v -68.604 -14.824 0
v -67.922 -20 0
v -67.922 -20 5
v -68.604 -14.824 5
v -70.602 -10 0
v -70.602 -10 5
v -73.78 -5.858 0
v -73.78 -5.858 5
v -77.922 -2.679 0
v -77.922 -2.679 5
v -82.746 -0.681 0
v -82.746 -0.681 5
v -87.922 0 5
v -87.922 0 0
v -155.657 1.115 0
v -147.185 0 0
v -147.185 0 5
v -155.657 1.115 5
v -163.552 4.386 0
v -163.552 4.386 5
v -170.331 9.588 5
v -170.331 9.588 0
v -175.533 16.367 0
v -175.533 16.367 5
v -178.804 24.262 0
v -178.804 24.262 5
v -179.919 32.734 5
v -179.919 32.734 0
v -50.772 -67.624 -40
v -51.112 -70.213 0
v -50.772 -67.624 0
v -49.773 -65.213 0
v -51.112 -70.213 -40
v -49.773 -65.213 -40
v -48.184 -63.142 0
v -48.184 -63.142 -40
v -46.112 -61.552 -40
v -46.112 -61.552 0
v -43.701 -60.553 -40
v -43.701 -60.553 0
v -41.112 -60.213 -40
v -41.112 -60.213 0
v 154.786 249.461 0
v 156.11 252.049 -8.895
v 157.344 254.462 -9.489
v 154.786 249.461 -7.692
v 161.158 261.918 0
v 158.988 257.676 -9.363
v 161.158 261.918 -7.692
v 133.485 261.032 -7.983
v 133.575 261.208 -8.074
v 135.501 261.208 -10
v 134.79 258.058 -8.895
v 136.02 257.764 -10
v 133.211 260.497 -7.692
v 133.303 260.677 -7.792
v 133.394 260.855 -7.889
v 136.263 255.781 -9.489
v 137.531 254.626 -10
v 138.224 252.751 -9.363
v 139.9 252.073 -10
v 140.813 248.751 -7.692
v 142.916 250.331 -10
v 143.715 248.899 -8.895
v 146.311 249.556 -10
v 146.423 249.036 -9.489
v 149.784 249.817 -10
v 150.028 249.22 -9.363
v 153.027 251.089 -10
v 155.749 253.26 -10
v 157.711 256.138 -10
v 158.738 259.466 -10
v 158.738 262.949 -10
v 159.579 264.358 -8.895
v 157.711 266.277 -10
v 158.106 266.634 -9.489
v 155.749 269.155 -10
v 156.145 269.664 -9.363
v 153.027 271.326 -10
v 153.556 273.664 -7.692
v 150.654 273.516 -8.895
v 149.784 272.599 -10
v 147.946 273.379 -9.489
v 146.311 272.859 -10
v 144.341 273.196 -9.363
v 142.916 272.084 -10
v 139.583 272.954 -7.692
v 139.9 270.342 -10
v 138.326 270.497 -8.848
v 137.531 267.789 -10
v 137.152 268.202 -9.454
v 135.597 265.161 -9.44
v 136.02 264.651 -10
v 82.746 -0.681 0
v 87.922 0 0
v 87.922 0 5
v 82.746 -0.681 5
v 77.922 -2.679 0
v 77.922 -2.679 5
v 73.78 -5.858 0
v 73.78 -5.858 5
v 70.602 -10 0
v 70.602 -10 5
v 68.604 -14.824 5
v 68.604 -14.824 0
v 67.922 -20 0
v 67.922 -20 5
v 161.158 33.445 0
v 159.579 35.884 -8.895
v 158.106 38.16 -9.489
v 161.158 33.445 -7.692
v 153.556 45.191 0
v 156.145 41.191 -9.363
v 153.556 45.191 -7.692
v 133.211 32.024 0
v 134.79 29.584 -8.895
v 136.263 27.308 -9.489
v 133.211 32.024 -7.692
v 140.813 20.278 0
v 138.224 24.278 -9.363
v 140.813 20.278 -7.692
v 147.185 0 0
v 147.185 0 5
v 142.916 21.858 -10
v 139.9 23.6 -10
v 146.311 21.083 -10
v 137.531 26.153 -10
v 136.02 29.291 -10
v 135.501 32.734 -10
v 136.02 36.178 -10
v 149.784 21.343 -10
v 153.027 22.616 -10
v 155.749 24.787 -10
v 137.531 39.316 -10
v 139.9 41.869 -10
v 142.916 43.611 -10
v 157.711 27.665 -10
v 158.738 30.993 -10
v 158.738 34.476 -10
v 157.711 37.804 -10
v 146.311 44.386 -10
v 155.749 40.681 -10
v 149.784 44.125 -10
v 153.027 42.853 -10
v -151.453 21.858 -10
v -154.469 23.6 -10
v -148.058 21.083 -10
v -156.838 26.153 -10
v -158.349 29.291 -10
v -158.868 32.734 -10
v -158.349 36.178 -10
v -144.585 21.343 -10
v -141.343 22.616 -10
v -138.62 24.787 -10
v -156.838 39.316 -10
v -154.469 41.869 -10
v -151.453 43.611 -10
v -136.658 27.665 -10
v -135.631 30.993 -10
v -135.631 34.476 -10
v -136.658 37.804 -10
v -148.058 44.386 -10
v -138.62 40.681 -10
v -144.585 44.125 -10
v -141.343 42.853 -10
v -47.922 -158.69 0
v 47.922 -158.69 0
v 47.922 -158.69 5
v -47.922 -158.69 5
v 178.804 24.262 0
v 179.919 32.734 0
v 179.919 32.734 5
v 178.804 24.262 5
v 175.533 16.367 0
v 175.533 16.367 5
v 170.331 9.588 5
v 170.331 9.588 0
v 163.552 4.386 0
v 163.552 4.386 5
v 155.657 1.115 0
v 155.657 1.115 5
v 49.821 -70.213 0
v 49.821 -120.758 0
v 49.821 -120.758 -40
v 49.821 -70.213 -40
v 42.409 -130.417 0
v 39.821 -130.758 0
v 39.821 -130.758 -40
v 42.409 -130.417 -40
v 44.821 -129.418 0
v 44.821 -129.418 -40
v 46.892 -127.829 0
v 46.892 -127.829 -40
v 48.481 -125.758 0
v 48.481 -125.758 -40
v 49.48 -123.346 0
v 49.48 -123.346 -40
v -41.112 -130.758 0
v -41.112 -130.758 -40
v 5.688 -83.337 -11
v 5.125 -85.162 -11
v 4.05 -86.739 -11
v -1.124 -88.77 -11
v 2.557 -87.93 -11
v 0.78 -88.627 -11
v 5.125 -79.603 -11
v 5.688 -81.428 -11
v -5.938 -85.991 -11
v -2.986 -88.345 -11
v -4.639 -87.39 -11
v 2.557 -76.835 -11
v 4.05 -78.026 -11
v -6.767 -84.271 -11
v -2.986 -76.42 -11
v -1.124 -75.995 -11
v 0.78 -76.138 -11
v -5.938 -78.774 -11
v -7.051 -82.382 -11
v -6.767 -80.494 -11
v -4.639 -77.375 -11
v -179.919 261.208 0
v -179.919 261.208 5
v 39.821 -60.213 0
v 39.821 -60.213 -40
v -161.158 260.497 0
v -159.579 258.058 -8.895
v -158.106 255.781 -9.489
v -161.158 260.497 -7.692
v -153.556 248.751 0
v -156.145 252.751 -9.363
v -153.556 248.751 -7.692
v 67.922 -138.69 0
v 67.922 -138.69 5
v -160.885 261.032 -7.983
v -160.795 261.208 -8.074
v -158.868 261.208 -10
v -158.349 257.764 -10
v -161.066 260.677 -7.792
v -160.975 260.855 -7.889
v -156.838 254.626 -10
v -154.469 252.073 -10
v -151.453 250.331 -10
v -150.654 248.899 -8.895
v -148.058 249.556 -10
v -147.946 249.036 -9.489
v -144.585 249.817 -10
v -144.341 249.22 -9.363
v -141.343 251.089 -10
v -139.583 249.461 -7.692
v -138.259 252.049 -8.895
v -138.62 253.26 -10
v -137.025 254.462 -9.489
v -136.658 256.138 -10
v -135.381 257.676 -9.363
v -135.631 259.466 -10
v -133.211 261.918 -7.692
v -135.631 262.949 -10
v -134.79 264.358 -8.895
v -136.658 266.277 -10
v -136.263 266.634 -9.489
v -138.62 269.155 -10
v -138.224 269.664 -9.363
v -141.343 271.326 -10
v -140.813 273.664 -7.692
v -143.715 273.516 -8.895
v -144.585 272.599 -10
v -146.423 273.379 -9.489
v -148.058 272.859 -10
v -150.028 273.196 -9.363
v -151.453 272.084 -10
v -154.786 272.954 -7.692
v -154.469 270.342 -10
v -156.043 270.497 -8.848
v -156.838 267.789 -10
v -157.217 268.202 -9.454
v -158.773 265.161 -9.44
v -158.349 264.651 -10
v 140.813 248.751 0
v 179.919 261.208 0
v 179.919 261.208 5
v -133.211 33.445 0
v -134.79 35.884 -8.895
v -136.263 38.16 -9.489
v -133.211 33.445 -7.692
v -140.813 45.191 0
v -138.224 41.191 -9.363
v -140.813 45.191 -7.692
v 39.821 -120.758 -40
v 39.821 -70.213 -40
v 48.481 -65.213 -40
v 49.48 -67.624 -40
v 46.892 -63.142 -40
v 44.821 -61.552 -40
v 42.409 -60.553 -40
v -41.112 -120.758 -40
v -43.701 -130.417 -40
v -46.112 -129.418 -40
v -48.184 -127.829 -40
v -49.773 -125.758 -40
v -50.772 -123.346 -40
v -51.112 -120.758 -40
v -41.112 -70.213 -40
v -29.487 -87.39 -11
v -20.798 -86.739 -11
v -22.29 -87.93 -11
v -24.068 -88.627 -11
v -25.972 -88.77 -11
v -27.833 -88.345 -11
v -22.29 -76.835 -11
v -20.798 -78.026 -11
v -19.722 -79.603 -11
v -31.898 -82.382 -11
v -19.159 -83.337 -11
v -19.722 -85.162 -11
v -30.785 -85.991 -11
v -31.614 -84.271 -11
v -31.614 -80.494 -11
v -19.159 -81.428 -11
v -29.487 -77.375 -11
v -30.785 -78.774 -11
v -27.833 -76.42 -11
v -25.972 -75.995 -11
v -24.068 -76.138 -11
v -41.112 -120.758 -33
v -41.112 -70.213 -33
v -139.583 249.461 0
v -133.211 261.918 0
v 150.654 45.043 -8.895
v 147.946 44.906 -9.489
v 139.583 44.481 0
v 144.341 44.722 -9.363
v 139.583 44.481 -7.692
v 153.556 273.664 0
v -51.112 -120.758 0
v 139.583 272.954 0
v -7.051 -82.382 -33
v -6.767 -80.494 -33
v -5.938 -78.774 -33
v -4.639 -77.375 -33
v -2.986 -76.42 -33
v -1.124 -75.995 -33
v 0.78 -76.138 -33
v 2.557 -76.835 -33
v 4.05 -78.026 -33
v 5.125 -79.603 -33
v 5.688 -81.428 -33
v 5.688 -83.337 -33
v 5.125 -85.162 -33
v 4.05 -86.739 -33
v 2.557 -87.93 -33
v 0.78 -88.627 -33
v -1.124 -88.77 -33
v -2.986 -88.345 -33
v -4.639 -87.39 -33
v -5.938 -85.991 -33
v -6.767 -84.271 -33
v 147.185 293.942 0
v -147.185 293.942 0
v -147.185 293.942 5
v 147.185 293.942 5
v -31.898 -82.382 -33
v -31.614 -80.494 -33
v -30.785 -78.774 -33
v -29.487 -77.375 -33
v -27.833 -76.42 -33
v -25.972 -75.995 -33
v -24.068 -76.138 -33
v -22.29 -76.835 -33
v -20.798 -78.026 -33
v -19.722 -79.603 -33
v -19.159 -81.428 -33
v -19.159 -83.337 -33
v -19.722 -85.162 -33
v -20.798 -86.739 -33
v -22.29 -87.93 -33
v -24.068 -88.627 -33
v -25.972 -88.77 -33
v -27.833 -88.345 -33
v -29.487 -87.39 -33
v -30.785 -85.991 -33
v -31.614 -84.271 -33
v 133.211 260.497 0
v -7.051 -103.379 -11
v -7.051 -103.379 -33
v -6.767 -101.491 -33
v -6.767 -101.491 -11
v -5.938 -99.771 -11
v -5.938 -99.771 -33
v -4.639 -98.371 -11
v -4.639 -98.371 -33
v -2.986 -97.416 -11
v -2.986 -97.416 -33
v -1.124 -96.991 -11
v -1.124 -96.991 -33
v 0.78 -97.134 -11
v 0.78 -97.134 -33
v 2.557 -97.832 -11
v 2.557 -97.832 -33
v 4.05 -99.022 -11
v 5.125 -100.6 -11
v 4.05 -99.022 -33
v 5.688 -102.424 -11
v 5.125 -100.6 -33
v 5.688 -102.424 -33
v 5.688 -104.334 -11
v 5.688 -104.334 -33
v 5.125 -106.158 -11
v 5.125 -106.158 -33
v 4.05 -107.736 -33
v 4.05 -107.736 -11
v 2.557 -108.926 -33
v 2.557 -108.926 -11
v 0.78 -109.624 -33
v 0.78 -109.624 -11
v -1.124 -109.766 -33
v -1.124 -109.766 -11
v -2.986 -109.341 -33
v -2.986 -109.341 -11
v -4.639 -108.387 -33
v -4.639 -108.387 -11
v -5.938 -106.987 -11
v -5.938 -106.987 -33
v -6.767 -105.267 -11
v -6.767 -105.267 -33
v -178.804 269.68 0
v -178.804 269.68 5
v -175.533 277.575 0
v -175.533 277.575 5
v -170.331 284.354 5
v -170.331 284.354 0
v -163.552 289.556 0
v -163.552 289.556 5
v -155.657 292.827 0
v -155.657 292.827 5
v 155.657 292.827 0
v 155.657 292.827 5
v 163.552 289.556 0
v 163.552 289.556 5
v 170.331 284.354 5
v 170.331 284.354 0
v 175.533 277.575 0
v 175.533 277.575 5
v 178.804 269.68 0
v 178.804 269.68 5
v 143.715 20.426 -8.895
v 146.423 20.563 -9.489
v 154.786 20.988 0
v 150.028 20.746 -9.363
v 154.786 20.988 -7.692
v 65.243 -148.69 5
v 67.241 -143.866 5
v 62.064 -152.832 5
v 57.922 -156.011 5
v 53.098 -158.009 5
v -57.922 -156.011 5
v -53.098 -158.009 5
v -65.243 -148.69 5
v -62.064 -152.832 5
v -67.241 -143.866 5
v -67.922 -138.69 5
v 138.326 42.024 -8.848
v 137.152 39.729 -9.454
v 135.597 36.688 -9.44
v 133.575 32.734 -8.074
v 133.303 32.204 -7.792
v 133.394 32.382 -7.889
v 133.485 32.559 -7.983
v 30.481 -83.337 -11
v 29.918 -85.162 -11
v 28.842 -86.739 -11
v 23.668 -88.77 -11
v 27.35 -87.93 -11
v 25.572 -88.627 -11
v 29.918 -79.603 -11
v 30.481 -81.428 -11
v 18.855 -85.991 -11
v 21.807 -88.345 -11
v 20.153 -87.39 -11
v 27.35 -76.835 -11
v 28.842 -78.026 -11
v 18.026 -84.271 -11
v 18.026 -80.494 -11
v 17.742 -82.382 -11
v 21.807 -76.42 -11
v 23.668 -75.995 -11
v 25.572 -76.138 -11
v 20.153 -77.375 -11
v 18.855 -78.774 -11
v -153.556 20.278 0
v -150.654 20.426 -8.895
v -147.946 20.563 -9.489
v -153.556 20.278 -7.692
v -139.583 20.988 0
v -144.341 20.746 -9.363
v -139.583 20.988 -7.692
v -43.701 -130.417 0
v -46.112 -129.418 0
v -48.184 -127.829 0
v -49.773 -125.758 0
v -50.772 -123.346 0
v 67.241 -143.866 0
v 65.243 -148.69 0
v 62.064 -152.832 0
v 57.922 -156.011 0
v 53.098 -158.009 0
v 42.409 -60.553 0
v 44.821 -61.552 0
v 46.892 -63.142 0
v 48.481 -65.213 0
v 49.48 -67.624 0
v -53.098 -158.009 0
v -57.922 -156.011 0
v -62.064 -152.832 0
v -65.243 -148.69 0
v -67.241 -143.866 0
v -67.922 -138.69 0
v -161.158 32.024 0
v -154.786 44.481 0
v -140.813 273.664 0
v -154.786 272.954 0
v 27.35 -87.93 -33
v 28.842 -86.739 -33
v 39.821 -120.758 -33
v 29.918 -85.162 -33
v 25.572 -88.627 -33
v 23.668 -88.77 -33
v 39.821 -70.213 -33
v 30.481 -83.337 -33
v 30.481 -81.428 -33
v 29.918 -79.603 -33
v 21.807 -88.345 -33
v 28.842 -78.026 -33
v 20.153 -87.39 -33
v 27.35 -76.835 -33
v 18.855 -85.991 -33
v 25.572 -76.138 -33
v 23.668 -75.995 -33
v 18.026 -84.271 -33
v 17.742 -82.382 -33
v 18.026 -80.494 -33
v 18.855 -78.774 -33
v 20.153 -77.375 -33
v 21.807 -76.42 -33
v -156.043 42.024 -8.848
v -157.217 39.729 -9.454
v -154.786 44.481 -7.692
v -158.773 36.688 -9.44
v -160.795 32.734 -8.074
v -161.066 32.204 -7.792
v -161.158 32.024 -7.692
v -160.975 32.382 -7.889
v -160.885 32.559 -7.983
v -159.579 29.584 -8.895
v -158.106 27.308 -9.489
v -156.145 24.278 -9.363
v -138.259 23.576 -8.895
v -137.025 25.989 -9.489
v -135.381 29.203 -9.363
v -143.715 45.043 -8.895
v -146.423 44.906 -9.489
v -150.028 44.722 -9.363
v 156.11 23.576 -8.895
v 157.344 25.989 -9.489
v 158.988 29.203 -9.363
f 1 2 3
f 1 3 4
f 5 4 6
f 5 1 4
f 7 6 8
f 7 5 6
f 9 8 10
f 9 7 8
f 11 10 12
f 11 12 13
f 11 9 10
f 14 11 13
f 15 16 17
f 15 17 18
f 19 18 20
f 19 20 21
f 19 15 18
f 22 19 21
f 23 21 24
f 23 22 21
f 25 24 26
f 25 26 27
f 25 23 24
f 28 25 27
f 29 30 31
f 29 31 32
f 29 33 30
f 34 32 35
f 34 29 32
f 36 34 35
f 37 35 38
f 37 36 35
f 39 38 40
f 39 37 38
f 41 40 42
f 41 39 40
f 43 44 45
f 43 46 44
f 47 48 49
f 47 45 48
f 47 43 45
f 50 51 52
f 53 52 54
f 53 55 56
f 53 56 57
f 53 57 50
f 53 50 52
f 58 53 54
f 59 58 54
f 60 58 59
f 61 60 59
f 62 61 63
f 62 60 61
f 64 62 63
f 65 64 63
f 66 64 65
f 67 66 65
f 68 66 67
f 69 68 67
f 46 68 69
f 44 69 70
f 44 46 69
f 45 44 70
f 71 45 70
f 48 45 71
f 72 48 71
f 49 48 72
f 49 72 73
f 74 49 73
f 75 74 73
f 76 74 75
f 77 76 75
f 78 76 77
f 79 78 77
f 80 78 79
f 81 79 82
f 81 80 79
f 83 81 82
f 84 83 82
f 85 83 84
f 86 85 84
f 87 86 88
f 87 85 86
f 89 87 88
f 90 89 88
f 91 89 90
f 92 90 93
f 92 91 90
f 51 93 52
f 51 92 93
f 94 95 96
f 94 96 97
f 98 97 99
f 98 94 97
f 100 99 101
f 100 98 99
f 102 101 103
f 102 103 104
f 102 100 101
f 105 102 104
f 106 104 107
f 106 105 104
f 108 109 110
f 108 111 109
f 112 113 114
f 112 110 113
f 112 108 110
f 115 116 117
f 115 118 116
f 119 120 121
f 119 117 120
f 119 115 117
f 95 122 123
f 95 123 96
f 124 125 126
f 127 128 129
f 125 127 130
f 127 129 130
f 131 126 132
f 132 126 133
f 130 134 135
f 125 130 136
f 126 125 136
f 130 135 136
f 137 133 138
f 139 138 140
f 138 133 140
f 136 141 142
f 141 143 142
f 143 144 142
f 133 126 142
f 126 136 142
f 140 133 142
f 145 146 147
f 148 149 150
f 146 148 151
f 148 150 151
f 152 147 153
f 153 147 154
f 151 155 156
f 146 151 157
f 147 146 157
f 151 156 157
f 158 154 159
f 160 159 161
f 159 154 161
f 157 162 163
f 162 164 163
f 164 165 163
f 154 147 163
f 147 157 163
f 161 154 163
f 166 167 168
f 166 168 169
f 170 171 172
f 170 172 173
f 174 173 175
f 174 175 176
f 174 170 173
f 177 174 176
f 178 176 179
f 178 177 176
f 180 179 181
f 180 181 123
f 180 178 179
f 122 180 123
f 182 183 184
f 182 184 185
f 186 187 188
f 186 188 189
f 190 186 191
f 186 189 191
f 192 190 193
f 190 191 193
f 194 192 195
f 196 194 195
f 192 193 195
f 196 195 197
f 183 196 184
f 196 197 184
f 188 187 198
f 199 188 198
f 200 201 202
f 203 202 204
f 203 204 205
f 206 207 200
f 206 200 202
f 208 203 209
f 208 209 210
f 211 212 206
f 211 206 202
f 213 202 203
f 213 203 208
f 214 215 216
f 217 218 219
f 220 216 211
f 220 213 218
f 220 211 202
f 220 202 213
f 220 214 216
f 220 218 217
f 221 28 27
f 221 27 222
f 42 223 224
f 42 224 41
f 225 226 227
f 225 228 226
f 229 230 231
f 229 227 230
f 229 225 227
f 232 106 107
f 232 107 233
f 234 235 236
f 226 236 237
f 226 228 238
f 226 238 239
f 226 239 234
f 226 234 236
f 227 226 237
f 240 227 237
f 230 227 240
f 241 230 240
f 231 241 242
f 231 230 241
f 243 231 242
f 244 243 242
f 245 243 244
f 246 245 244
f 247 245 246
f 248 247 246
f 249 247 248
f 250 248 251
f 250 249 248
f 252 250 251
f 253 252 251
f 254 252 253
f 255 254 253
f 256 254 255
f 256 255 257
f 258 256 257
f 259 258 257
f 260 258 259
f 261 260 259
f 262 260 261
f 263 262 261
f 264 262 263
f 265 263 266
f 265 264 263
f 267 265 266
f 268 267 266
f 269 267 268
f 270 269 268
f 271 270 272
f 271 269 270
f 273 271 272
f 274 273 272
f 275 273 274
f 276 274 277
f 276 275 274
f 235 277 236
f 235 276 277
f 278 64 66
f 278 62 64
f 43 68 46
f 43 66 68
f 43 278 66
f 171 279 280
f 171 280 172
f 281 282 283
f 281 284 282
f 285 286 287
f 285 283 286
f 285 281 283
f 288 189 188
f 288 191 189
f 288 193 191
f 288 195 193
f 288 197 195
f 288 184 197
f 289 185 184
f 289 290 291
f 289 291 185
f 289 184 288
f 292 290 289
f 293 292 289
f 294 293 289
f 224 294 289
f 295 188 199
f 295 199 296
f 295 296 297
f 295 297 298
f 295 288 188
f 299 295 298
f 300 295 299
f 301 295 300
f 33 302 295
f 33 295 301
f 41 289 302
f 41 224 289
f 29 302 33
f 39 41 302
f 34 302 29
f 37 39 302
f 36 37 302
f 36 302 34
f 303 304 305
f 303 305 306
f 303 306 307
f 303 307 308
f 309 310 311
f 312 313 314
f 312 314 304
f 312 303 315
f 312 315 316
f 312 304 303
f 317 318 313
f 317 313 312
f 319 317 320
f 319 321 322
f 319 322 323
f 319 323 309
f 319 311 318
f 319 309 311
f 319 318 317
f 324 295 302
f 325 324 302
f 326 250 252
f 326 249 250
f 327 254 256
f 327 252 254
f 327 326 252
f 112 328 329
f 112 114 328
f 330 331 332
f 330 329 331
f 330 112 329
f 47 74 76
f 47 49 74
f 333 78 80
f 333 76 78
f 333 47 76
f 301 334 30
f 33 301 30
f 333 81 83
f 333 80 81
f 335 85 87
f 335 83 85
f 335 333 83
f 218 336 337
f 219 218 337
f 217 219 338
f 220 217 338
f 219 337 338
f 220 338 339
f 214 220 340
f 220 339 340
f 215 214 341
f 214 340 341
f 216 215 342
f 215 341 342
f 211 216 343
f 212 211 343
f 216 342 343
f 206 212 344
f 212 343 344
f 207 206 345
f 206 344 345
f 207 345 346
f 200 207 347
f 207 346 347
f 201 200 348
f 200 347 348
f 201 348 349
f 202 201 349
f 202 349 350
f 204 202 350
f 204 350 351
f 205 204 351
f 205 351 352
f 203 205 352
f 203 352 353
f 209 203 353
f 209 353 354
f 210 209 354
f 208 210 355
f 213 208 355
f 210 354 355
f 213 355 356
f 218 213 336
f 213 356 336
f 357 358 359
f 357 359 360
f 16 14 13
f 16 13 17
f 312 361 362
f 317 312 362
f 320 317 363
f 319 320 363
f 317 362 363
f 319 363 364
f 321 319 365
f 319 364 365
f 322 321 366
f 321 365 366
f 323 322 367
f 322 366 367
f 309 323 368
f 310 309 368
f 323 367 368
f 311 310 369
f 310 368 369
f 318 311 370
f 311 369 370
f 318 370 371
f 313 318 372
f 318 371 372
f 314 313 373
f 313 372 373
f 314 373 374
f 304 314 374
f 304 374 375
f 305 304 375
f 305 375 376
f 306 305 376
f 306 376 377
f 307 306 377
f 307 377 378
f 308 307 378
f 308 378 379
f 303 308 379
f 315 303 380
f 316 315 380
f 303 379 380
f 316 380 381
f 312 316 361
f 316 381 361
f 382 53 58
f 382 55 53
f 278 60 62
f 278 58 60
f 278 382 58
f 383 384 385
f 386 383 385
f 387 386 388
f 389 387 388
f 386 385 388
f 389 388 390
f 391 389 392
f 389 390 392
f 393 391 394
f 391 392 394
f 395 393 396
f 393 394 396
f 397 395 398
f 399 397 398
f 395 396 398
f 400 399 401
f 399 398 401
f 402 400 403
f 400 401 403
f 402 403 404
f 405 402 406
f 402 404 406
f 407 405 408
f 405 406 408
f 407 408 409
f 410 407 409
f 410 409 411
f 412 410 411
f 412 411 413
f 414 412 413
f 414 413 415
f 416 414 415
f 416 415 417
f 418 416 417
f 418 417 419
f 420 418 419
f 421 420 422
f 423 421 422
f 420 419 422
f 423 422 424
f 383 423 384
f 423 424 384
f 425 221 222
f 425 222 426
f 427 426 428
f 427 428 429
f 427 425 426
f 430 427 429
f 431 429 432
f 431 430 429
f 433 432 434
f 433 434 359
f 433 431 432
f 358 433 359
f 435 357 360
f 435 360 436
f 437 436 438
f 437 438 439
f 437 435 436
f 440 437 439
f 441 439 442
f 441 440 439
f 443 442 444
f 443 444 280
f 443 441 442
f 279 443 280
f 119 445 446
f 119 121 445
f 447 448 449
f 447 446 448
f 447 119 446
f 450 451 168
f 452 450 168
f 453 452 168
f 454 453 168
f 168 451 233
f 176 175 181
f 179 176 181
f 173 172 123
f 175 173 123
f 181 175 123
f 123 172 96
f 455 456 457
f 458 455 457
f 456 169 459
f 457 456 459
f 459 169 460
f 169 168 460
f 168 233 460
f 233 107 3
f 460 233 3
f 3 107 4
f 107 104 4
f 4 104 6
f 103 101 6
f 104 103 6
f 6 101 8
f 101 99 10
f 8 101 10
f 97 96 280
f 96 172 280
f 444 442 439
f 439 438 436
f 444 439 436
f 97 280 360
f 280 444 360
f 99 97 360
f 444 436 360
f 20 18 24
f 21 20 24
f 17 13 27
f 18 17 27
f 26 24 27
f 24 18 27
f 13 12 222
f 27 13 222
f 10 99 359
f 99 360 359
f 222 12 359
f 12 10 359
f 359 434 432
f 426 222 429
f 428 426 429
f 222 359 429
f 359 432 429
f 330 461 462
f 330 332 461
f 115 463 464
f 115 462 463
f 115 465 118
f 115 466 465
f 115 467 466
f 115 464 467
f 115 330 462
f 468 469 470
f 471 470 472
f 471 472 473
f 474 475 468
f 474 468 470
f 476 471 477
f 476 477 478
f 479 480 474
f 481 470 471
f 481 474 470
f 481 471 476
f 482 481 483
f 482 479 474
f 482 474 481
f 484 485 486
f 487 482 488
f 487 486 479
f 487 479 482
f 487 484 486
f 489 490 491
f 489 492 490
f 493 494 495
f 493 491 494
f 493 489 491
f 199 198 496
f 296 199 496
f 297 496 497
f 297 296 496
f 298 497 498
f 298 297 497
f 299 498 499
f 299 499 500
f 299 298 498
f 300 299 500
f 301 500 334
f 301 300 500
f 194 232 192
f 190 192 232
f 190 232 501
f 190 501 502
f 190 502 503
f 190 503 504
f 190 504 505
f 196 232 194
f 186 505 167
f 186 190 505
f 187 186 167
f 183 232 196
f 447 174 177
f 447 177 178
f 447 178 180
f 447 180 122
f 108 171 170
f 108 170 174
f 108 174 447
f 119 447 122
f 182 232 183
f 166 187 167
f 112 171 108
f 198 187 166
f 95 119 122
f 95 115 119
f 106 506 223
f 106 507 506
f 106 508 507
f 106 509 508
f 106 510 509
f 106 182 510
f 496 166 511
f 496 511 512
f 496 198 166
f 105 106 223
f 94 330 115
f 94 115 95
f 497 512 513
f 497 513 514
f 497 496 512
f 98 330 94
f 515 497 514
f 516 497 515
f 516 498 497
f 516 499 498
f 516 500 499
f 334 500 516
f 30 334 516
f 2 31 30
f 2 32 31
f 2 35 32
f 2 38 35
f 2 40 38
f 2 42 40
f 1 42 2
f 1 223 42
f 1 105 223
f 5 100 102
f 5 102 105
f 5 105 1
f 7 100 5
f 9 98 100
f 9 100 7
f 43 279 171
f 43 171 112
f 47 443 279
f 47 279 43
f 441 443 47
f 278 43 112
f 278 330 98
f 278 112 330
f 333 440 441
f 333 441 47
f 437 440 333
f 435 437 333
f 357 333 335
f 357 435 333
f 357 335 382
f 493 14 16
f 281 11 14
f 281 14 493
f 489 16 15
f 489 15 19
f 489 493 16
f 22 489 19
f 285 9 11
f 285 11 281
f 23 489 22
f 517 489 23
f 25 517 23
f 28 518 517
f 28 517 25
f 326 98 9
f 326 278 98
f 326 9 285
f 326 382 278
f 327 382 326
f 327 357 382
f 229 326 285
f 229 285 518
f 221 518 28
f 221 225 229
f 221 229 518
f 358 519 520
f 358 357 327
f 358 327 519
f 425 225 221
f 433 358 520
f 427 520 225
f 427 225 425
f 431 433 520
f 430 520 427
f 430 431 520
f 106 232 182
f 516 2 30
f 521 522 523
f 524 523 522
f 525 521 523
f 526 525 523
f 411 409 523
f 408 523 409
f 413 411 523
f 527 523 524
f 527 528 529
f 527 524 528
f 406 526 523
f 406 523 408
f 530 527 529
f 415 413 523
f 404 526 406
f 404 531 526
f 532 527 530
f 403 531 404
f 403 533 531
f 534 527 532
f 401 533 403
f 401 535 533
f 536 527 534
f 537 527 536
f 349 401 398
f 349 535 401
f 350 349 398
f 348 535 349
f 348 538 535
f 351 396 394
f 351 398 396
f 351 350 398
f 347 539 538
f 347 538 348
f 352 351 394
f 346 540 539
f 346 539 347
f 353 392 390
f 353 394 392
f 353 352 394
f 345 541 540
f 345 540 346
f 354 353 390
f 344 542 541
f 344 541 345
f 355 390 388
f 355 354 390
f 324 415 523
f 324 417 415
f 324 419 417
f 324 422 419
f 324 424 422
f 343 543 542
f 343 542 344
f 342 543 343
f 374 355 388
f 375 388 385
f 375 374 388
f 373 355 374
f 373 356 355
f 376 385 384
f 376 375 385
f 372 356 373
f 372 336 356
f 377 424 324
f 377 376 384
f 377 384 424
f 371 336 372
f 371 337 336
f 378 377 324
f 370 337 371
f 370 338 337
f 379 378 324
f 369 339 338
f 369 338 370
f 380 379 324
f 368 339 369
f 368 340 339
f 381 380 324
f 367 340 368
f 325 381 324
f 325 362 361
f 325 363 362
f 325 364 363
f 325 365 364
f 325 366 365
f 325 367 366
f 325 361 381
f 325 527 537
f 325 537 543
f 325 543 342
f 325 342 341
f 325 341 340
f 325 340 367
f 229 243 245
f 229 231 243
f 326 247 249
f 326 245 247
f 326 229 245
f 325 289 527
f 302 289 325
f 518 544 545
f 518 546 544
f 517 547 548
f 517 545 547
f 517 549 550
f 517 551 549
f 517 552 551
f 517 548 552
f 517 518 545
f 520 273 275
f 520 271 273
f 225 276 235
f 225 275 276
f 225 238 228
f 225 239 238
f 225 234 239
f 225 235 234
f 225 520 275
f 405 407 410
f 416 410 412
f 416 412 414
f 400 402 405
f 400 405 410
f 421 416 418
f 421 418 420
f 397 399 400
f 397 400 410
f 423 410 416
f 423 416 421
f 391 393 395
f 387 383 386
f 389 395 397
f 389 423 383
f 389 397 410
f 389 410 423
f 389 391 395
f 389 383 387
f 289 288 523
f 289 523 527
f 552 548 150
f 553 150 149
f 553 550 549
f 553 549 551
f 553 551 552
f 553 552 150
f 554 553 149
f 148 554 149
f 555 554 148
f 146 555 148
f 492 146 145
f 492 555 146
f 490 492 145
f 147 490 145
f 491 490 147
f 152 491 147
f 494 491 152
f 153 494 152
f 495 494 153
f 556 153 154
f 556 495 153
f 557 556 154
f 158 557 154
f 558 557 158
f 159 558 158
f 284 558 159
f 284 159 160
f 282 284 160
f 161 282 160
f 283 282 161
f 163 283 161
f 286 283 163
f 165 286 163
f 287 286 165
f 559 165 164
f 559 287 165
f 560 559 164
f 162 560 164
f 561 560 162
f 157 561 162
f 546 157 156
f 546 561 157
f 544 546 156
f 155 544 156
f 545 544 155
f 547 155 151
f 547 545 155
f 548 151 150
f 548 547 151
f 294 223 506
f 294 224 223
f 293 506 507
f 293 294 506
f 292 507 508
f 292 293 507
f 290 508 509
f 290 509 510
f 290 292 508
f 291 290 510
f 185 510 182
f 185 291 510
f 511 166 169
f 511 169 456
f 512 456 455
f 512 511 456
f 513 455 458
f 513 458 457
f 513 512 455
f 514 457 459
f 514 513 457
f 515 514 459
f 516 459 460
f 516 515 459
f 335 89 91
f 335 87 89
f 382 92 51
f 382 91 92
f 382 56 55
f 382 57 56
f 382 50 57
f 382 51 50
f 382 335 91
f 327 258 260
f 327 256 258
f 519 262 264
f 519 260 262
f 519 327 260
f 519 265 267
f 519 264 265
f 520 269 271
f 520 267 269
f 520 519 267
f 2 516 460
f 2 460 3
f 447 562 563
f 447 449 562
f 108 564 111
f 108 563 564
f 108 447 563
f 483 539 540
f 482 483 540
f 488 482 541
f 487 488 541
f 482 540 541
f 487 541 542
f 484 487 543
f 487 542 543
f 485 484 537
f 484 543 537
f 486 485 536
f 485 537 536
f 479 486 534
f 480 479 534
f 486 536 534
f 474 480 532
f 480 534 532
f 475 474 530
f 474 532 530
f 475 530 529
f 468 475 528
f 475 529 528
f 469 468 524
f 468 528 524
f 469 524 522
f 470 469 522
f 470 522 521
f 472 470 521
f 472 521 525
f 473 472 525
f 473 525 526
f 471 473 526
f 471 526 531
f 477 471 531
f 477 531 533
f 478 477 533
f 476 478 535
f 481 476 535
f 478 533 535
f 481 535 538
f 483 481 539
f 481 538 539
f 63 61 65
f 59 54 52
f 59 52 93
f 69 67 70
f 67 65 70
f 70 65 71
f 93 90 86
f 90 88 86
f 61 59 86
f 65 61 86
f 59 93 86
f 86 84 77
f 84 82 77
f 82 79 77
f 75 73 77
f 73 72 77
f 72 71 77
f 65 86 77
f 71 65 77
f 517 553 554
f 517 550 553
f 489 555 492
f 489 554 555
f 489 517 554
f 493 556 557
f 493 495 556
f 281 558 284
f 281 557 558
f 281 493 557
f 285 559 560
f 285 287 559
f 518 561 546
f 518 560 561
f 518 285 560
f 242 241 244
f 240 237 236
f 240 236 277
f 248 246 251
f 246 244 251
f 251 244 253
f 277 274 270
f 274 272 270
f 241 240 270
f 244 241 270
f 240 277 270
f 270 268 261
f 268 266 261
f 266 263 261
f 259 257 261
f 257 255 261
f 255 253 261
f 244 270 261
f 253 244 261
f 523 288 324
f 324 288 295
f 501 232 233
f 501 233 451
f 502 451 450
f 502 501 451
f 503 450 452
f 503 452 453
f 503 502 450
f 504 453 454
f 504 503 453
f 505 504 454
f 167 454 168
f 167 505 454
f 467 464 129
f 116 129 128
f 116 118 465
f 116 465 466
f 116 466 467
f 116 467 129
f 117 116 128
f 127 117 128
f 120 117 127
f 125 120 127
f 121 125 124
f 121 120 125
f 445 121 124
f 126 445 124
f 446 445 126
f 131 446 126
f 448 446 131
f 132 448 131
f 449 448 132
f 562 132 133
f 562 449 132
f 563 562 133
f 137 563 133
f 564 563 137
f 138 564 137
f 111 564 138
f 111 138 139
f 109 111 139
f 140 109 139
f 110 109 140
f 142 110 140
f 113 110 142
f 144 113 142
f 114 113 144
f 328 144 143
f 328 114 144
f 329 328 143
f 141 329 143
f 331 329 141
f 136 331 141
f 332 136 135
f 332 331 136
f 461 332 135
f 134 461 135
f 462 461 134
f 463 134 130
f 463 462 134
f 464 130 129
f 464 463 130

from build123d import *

# Parameters (mm, degrees)
BOSS_EXTRUDE1_DEPTH = 5
SKETCH2_R           = 9
CUT_EXTRUDE1_DEPTH  = 75
BOSS_EXTRUDE2_DEPTH = 15
SKETCH4_R           = 18.116170111
SKETCH4_R_2         = 11.683917043
CUT_EXTRUDE2_DEPTH  = 15
CUT_EXTRUDE2_TAPER  = 45
SKETCH5_W           = 100.933414707
SKETCH5_H           = 70.54527083
BOSS_EXTRUDE3_DEPTH = 40
FILLET1_R           = 10
SKETCH6_W           = 80.933414707
SKETCH6_H           = 50.54527083
CUT_EXTRUDE3_DEPTH  = 7
SKETCH7_R           = 6.405339055
CUT_EXTRUDE4_DEPTH  = 22


with BuildPart() as part:
    # Sketch1 → Boss-Extrude1 (new body)
    with BuildSketch(Plane.XY):
        with BuildLine():
            Line((-147.184574627, 293.941978101), (147.184574627, 293.941978101))
            ThreePointArc((147.184574627, 293.941978101), (170.33130349, 284.354289081), (179.91899251, 261.207560218))
            Line((179.91899251, 261.207560218), (179.91899251, 32.734417883))
            ThreePointArc((179.91899251, 32.734417883), (170.33130349, 9.58768902), (147.184574627, 0))
            Line((147.184574627, 0), (87.922065379, 0))
            ThreePointArc((87.922065379, 0), (73.779929755, -5.857864376), (67.922065379, -20))
            Line((67.922065379, -20), (67.922065379, -138.690071177))
            ThreePointArc((67.922065379, -138.690071177), (62.064201003, -152.832206801), (47.922065379, -158.690071177))
            Line((47.922065379, -158.690071177), (-47.922065379, -158.690071177))
            ThreePointArc((-47.922065379, -158.690071177), (-62.064201003, -152.832206801), (-67.922065379, -138.690071177))
            Line((-67.922065379, -138.690071177), (-67.922065379, -20))
            ThreePointArc((-67.922065379, -20), (-73.779929755, -5.857864376), (-87.922065379, 0))
            Line((-87.922065379, 0), (-147.184574627, 0))
            ThreePointArc((-147.184574627, 0), (-170.33130349, 9.58768902), (-179.91899251, 32.734417883))
            Line((-179.91899251, 32.734417883), (-179.91899251, 261.207560218))
            ThreePointArc((-179.91899251, 261.207560218), (-170.33130349, 284.354289081), (-147.184574627, 293.941978101))
        make_face()
    extrude(amount=BOSS_EXTRUDE1_DEPTH)

    # Sketch2 → Cut-Extrude1 (cut)
    with BuildSketch(Plane.XY.offset(5)):
        with Locations((-147.184574627, 261.207560218)):
            Circle(SKETCH2_R)
        with Locations((147.184574627, 261.207560218)):
            Circle(SKETCH2_R)
        with Locations((147.184574627, 32.734417883)):
            Circle(SKETCH2_R)
        with Locations((-147.184574627, 32.734417883)):
            Circle(SKETCH2_R)
    extrude(amount=-CUT_EXTRUDE1_DEPTH, mode=Mode.SUBTRACT)

    # Sketch3 → Boss-Extrude2 (add)
    with BuildSketch(Plane.XY.offset(5)):
        Polygon((139.58276715, 272.953720991), (133.211197263, 260.497282214), (140.81300474, 248.751121442), (154.786382105, 249.461399446), (161.157951992, 261.917838222), (153.556144514, 273.663998995), align=None)
        Polygon((-140.81300474, 273.663998995), (-154.786382105, 272.953720991), (-161.157951992, 260.497282214), (-153.556144514, 248.751121442), (-139.58276715, 249.461399446), (-133.211197263, 261.917838222), align=None)
        Polygon((139.58276715, 44.480578655), (133.211197263, 32.024139879), (140.81300474, 20.277979107), (154.786382105, 20.988257111), (161.157951992, 33.444695887), (153.556144514, 45.190856659), align=None)
        Polygon((-154.786382105, 44.480578655), (-161.157951992, 32.024139879), (-153.556144514, 20.277979107), (-139.58276715, 20.988257111), (-133.211197263, 33.444695887), (-140.81300474, 45.190856659), align=None)
    extrude(amount=-BOSS_EXTRUDE2_DEPTH)

    # Sketch4 → Cut-Extrude2 (cut)
    # profile 1 of 4: a face of its own
    with BuildSketch(Plane(origin=(0, 0, -10), x_dir=(-1, 0, 0), z_dir=(0, 0, -1))):
        with Locations((-147.184574627, 261.207560218)):
            Circle(SKETCH4_R)
        with Locations((-147.184574627, 261.207560218)):
            Circle(SKETCH4_R_2, mode=Mode.SUBTRACT)
    # profile 2 of 4: a face of its own
    with BuildSketch(Plane(origin=(0, 0, -10), x_dir=(-1, 0, 0), z_dir=(0, 0, -1))):
        with Locations((-147.184574627, 32.734417883)):
            Circle(SKETCH4_R)
        with Locations((-147.184574627, 32.734417883)):
            Circle(SKETCH4_R_2, mode=Mode.SUBTRACT)
    # profile 3 of 4: a face of its own
    with BuildSketch(Plane(origin=(0, 0, -10), x_dir=(-1, 0, 0), z_dir=(0, 0, -1))):
        with Locations((147.184574627, 32.734417883)):
            Circle(SKETCH4_R)
        with Locations((147.184574627, 32.734417883)):
            Circle(SKETCH4_R_2, mode=Mode.SUBTRACT)
    # profile 4 of 4: a face of its own
    with BuildSketch(Plane(origin=(0, 0, -10), x_dir=(-1, 0, 0), z_dir=(0, 0, -1))):
        with Locations((147.184574627, 261.207560218)):
            Circle(SKETCH4_R)
        with Locations((147.184574627, 261.207560218)):
            Circle(SKETCH4_R_2, mode=Mode.SUBTRACT)
    extrude(amount=-CUT_EXTRUDE2_DEPTH, taper=CUT_EXTRUDE2_TAPER, mode=Mode.SUBTRACT)

    # Sketch5 → Boss-Extrude3 (add)
    with BuildSketch(Plane(origin=(0, 0, 0), x_dir=(-1, 0, 0), z_dir=(0, 0, -1))):
        with Locations((0.645780789, -95.485224261)):
            Rectangle(SKETCH5_W, SKETCH5_H)
    extrude(amount=BOSS_EXTRUDE3_DEPTH)

    # Fillet1
    fillet1_edges = [part.edges().sort_by_distance(p)[0] for p in [
        (49.820926565, -60.212588846, -20),
        (49.820926565, -130.757859676, -20),
        (-51.112488142, -130.757859676, -20),
        (-51.112488142, -60.212588846, -20),
    ]]
    fillet(fillet1_edges, radius=FILLET1_R)

    # Sketch6 → Cut-Extrude3 (cut)
    with BuildSketch(Plane(origin=(0, 0, -40), x_dir=(-1, 0, 0), z_dir=(0, 0, -1))):
        with Locations((0.645780789, -95.485224261)):
            Rectangle(SKETCH6_W, SKETCH6_H)
    extrude(amount=-CUT_EXTRUDE3_DEPTH, mode=Mode.SUBTRACT)

    # Sketch7 → Cut-Extrude4 (cut)
    with BuildSketch(Plane(origin=(0, 0, -33), x_dir=(-1, 0, 0), z_dir=(0, 0, -1))):
        with Locations((-24.146994076, -82.382499347)):
            Circle(SKETCH7_R)
        with Locations((0.645780789, -82.382499347)):
            Circle(SKETCH7_R)
        with Locations((0.645780789, -103.378848644)):
            Circle(SKETCH7_R)
        with Locations((25.493027066, -82.382499347)):
            Circle(SKETCH7_R)
    extrude(amount=-CUT_EXTRUDE4_DEPTH, mode=Mode.SUBTRACT)


solid = part.part
